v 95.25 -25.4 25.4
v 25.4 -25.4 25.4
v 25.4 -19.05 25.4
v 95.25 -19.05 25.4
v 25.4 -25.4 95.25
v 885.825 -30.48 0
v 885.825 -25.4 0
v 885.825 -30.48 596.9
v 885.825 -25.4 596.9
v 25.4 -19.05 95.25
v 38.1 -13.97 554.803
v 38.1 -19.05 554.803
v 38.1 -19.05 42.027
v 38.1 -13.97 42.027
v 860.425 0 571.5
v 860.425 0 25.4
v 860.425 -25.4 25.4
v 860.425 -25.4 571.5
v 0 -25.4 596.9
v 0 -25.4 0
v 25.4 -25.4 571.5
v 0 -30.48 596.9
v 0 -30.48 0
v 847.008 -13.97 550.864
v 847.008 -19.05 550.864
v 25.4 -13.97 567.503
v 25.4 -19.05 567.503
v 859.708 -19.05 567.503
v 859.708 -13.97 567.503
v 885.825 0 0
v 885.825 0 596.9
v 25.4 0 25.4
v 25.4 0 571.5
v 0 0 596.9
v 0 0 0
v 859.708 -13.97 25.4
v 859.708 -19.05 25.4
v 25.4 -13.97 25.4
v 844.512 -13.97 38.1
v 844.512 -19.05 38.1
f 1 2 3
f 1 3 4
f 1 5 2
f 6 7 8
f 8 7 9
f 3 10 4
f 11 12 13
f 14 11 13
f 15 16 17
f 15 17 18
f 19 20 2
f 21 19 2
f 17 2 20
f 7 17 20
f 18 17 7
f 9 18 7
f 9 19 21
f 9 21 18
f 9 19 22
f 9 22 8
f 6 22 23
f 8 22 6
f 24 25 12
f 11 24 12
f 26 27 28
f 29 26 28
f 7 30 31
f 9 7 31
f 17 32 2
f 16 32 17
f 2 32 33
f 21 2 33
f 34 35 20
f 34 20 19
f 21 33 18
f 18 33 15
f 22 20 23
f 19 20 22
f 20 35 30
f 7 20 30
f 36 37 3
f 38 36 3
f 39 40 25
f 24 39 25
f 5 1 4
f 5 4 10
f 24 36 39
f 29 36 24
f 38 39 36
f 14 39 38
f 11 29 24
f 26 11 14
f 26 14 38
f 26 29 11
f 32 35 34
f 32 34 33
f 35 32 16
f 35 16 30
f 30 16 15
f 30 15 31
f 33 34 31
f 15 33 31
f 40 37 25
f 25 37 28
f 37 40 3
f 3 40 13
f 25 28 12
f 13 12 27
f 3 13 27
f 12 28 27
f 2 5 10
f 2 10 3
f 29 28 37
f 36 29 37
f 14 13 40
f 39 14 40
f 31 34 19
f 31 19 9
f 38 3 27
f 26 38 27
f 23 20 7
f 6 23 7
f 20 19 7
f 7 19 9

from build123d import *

# Parameters (mm, degrees)
F0_W     = 885.825
F0_H     = 596.9
F0_W_2   = 835.025
F0_H_2   = 546.1
F1_DEPTH = 25.4
F3_DEPTH = 6.35
F4_W     = 885.825
F4_H     = 596.9
F5_DEPTH = 5.08
F7_DEPTH = 5.08


with BuildPart() as f1:
    # F0 (on Front) → F1 (new body)
    with BuildSketch(Plane.XZ):
        with Locations((442.9125, 298.45)):
            Rectangle(F0_W, F0_H)
        with Locations((442.9125, 298.45)):
            Rectangle(F0_W_2, F0_H_2, mode=Mode.SUBTRACT)
    extrude(amount=F1_DEPTH)


with BuildPart() as f3:
    # F2 (on face) → F3 (new body)
    with BuildSketch(Plane.XZ.offset(25.4)):
        Polygon((25.4, 95.25), (25.4, 25.4), (95.25, 25.4), align=None)
    extrude(amount=-F3_DEPTH)


with BuildPart() as f5:
    # F4 (on face) → F5 (new body)
    with BuildSketch(Plane.XZ.offset(25.4)):
        with Locations((442.9125, 298.45)):
            Rectangle(F4_W, F4_H)
    extrude(amount=F5_DEPTH)


with BuildPart() as f7:
    # F6 (on face) → F7 (new body)
    with BuildSketch(Plane(origin=(0, -19.05, 0), x_dir=(-1, 0, 0), z_dir=(0, 1, 0))):
        Polygon((-38.1, 25.4), (-25.4, 25.4), (-25.4, 567.502618), (-859.708309, 567.502618), (-859.708309, 25.4), align=None)
        Polygon((-38.1, 554.802618), (-38.1, 42.026595), (-844.511604, 38.099849), (-847.00846, 550.863714), align=None, mode=Mode.SUBTRACT)
    extrude(amount=F7_DEPTH)


solid = Compound([f1.part, f3.part, f5.part, f7.part])
